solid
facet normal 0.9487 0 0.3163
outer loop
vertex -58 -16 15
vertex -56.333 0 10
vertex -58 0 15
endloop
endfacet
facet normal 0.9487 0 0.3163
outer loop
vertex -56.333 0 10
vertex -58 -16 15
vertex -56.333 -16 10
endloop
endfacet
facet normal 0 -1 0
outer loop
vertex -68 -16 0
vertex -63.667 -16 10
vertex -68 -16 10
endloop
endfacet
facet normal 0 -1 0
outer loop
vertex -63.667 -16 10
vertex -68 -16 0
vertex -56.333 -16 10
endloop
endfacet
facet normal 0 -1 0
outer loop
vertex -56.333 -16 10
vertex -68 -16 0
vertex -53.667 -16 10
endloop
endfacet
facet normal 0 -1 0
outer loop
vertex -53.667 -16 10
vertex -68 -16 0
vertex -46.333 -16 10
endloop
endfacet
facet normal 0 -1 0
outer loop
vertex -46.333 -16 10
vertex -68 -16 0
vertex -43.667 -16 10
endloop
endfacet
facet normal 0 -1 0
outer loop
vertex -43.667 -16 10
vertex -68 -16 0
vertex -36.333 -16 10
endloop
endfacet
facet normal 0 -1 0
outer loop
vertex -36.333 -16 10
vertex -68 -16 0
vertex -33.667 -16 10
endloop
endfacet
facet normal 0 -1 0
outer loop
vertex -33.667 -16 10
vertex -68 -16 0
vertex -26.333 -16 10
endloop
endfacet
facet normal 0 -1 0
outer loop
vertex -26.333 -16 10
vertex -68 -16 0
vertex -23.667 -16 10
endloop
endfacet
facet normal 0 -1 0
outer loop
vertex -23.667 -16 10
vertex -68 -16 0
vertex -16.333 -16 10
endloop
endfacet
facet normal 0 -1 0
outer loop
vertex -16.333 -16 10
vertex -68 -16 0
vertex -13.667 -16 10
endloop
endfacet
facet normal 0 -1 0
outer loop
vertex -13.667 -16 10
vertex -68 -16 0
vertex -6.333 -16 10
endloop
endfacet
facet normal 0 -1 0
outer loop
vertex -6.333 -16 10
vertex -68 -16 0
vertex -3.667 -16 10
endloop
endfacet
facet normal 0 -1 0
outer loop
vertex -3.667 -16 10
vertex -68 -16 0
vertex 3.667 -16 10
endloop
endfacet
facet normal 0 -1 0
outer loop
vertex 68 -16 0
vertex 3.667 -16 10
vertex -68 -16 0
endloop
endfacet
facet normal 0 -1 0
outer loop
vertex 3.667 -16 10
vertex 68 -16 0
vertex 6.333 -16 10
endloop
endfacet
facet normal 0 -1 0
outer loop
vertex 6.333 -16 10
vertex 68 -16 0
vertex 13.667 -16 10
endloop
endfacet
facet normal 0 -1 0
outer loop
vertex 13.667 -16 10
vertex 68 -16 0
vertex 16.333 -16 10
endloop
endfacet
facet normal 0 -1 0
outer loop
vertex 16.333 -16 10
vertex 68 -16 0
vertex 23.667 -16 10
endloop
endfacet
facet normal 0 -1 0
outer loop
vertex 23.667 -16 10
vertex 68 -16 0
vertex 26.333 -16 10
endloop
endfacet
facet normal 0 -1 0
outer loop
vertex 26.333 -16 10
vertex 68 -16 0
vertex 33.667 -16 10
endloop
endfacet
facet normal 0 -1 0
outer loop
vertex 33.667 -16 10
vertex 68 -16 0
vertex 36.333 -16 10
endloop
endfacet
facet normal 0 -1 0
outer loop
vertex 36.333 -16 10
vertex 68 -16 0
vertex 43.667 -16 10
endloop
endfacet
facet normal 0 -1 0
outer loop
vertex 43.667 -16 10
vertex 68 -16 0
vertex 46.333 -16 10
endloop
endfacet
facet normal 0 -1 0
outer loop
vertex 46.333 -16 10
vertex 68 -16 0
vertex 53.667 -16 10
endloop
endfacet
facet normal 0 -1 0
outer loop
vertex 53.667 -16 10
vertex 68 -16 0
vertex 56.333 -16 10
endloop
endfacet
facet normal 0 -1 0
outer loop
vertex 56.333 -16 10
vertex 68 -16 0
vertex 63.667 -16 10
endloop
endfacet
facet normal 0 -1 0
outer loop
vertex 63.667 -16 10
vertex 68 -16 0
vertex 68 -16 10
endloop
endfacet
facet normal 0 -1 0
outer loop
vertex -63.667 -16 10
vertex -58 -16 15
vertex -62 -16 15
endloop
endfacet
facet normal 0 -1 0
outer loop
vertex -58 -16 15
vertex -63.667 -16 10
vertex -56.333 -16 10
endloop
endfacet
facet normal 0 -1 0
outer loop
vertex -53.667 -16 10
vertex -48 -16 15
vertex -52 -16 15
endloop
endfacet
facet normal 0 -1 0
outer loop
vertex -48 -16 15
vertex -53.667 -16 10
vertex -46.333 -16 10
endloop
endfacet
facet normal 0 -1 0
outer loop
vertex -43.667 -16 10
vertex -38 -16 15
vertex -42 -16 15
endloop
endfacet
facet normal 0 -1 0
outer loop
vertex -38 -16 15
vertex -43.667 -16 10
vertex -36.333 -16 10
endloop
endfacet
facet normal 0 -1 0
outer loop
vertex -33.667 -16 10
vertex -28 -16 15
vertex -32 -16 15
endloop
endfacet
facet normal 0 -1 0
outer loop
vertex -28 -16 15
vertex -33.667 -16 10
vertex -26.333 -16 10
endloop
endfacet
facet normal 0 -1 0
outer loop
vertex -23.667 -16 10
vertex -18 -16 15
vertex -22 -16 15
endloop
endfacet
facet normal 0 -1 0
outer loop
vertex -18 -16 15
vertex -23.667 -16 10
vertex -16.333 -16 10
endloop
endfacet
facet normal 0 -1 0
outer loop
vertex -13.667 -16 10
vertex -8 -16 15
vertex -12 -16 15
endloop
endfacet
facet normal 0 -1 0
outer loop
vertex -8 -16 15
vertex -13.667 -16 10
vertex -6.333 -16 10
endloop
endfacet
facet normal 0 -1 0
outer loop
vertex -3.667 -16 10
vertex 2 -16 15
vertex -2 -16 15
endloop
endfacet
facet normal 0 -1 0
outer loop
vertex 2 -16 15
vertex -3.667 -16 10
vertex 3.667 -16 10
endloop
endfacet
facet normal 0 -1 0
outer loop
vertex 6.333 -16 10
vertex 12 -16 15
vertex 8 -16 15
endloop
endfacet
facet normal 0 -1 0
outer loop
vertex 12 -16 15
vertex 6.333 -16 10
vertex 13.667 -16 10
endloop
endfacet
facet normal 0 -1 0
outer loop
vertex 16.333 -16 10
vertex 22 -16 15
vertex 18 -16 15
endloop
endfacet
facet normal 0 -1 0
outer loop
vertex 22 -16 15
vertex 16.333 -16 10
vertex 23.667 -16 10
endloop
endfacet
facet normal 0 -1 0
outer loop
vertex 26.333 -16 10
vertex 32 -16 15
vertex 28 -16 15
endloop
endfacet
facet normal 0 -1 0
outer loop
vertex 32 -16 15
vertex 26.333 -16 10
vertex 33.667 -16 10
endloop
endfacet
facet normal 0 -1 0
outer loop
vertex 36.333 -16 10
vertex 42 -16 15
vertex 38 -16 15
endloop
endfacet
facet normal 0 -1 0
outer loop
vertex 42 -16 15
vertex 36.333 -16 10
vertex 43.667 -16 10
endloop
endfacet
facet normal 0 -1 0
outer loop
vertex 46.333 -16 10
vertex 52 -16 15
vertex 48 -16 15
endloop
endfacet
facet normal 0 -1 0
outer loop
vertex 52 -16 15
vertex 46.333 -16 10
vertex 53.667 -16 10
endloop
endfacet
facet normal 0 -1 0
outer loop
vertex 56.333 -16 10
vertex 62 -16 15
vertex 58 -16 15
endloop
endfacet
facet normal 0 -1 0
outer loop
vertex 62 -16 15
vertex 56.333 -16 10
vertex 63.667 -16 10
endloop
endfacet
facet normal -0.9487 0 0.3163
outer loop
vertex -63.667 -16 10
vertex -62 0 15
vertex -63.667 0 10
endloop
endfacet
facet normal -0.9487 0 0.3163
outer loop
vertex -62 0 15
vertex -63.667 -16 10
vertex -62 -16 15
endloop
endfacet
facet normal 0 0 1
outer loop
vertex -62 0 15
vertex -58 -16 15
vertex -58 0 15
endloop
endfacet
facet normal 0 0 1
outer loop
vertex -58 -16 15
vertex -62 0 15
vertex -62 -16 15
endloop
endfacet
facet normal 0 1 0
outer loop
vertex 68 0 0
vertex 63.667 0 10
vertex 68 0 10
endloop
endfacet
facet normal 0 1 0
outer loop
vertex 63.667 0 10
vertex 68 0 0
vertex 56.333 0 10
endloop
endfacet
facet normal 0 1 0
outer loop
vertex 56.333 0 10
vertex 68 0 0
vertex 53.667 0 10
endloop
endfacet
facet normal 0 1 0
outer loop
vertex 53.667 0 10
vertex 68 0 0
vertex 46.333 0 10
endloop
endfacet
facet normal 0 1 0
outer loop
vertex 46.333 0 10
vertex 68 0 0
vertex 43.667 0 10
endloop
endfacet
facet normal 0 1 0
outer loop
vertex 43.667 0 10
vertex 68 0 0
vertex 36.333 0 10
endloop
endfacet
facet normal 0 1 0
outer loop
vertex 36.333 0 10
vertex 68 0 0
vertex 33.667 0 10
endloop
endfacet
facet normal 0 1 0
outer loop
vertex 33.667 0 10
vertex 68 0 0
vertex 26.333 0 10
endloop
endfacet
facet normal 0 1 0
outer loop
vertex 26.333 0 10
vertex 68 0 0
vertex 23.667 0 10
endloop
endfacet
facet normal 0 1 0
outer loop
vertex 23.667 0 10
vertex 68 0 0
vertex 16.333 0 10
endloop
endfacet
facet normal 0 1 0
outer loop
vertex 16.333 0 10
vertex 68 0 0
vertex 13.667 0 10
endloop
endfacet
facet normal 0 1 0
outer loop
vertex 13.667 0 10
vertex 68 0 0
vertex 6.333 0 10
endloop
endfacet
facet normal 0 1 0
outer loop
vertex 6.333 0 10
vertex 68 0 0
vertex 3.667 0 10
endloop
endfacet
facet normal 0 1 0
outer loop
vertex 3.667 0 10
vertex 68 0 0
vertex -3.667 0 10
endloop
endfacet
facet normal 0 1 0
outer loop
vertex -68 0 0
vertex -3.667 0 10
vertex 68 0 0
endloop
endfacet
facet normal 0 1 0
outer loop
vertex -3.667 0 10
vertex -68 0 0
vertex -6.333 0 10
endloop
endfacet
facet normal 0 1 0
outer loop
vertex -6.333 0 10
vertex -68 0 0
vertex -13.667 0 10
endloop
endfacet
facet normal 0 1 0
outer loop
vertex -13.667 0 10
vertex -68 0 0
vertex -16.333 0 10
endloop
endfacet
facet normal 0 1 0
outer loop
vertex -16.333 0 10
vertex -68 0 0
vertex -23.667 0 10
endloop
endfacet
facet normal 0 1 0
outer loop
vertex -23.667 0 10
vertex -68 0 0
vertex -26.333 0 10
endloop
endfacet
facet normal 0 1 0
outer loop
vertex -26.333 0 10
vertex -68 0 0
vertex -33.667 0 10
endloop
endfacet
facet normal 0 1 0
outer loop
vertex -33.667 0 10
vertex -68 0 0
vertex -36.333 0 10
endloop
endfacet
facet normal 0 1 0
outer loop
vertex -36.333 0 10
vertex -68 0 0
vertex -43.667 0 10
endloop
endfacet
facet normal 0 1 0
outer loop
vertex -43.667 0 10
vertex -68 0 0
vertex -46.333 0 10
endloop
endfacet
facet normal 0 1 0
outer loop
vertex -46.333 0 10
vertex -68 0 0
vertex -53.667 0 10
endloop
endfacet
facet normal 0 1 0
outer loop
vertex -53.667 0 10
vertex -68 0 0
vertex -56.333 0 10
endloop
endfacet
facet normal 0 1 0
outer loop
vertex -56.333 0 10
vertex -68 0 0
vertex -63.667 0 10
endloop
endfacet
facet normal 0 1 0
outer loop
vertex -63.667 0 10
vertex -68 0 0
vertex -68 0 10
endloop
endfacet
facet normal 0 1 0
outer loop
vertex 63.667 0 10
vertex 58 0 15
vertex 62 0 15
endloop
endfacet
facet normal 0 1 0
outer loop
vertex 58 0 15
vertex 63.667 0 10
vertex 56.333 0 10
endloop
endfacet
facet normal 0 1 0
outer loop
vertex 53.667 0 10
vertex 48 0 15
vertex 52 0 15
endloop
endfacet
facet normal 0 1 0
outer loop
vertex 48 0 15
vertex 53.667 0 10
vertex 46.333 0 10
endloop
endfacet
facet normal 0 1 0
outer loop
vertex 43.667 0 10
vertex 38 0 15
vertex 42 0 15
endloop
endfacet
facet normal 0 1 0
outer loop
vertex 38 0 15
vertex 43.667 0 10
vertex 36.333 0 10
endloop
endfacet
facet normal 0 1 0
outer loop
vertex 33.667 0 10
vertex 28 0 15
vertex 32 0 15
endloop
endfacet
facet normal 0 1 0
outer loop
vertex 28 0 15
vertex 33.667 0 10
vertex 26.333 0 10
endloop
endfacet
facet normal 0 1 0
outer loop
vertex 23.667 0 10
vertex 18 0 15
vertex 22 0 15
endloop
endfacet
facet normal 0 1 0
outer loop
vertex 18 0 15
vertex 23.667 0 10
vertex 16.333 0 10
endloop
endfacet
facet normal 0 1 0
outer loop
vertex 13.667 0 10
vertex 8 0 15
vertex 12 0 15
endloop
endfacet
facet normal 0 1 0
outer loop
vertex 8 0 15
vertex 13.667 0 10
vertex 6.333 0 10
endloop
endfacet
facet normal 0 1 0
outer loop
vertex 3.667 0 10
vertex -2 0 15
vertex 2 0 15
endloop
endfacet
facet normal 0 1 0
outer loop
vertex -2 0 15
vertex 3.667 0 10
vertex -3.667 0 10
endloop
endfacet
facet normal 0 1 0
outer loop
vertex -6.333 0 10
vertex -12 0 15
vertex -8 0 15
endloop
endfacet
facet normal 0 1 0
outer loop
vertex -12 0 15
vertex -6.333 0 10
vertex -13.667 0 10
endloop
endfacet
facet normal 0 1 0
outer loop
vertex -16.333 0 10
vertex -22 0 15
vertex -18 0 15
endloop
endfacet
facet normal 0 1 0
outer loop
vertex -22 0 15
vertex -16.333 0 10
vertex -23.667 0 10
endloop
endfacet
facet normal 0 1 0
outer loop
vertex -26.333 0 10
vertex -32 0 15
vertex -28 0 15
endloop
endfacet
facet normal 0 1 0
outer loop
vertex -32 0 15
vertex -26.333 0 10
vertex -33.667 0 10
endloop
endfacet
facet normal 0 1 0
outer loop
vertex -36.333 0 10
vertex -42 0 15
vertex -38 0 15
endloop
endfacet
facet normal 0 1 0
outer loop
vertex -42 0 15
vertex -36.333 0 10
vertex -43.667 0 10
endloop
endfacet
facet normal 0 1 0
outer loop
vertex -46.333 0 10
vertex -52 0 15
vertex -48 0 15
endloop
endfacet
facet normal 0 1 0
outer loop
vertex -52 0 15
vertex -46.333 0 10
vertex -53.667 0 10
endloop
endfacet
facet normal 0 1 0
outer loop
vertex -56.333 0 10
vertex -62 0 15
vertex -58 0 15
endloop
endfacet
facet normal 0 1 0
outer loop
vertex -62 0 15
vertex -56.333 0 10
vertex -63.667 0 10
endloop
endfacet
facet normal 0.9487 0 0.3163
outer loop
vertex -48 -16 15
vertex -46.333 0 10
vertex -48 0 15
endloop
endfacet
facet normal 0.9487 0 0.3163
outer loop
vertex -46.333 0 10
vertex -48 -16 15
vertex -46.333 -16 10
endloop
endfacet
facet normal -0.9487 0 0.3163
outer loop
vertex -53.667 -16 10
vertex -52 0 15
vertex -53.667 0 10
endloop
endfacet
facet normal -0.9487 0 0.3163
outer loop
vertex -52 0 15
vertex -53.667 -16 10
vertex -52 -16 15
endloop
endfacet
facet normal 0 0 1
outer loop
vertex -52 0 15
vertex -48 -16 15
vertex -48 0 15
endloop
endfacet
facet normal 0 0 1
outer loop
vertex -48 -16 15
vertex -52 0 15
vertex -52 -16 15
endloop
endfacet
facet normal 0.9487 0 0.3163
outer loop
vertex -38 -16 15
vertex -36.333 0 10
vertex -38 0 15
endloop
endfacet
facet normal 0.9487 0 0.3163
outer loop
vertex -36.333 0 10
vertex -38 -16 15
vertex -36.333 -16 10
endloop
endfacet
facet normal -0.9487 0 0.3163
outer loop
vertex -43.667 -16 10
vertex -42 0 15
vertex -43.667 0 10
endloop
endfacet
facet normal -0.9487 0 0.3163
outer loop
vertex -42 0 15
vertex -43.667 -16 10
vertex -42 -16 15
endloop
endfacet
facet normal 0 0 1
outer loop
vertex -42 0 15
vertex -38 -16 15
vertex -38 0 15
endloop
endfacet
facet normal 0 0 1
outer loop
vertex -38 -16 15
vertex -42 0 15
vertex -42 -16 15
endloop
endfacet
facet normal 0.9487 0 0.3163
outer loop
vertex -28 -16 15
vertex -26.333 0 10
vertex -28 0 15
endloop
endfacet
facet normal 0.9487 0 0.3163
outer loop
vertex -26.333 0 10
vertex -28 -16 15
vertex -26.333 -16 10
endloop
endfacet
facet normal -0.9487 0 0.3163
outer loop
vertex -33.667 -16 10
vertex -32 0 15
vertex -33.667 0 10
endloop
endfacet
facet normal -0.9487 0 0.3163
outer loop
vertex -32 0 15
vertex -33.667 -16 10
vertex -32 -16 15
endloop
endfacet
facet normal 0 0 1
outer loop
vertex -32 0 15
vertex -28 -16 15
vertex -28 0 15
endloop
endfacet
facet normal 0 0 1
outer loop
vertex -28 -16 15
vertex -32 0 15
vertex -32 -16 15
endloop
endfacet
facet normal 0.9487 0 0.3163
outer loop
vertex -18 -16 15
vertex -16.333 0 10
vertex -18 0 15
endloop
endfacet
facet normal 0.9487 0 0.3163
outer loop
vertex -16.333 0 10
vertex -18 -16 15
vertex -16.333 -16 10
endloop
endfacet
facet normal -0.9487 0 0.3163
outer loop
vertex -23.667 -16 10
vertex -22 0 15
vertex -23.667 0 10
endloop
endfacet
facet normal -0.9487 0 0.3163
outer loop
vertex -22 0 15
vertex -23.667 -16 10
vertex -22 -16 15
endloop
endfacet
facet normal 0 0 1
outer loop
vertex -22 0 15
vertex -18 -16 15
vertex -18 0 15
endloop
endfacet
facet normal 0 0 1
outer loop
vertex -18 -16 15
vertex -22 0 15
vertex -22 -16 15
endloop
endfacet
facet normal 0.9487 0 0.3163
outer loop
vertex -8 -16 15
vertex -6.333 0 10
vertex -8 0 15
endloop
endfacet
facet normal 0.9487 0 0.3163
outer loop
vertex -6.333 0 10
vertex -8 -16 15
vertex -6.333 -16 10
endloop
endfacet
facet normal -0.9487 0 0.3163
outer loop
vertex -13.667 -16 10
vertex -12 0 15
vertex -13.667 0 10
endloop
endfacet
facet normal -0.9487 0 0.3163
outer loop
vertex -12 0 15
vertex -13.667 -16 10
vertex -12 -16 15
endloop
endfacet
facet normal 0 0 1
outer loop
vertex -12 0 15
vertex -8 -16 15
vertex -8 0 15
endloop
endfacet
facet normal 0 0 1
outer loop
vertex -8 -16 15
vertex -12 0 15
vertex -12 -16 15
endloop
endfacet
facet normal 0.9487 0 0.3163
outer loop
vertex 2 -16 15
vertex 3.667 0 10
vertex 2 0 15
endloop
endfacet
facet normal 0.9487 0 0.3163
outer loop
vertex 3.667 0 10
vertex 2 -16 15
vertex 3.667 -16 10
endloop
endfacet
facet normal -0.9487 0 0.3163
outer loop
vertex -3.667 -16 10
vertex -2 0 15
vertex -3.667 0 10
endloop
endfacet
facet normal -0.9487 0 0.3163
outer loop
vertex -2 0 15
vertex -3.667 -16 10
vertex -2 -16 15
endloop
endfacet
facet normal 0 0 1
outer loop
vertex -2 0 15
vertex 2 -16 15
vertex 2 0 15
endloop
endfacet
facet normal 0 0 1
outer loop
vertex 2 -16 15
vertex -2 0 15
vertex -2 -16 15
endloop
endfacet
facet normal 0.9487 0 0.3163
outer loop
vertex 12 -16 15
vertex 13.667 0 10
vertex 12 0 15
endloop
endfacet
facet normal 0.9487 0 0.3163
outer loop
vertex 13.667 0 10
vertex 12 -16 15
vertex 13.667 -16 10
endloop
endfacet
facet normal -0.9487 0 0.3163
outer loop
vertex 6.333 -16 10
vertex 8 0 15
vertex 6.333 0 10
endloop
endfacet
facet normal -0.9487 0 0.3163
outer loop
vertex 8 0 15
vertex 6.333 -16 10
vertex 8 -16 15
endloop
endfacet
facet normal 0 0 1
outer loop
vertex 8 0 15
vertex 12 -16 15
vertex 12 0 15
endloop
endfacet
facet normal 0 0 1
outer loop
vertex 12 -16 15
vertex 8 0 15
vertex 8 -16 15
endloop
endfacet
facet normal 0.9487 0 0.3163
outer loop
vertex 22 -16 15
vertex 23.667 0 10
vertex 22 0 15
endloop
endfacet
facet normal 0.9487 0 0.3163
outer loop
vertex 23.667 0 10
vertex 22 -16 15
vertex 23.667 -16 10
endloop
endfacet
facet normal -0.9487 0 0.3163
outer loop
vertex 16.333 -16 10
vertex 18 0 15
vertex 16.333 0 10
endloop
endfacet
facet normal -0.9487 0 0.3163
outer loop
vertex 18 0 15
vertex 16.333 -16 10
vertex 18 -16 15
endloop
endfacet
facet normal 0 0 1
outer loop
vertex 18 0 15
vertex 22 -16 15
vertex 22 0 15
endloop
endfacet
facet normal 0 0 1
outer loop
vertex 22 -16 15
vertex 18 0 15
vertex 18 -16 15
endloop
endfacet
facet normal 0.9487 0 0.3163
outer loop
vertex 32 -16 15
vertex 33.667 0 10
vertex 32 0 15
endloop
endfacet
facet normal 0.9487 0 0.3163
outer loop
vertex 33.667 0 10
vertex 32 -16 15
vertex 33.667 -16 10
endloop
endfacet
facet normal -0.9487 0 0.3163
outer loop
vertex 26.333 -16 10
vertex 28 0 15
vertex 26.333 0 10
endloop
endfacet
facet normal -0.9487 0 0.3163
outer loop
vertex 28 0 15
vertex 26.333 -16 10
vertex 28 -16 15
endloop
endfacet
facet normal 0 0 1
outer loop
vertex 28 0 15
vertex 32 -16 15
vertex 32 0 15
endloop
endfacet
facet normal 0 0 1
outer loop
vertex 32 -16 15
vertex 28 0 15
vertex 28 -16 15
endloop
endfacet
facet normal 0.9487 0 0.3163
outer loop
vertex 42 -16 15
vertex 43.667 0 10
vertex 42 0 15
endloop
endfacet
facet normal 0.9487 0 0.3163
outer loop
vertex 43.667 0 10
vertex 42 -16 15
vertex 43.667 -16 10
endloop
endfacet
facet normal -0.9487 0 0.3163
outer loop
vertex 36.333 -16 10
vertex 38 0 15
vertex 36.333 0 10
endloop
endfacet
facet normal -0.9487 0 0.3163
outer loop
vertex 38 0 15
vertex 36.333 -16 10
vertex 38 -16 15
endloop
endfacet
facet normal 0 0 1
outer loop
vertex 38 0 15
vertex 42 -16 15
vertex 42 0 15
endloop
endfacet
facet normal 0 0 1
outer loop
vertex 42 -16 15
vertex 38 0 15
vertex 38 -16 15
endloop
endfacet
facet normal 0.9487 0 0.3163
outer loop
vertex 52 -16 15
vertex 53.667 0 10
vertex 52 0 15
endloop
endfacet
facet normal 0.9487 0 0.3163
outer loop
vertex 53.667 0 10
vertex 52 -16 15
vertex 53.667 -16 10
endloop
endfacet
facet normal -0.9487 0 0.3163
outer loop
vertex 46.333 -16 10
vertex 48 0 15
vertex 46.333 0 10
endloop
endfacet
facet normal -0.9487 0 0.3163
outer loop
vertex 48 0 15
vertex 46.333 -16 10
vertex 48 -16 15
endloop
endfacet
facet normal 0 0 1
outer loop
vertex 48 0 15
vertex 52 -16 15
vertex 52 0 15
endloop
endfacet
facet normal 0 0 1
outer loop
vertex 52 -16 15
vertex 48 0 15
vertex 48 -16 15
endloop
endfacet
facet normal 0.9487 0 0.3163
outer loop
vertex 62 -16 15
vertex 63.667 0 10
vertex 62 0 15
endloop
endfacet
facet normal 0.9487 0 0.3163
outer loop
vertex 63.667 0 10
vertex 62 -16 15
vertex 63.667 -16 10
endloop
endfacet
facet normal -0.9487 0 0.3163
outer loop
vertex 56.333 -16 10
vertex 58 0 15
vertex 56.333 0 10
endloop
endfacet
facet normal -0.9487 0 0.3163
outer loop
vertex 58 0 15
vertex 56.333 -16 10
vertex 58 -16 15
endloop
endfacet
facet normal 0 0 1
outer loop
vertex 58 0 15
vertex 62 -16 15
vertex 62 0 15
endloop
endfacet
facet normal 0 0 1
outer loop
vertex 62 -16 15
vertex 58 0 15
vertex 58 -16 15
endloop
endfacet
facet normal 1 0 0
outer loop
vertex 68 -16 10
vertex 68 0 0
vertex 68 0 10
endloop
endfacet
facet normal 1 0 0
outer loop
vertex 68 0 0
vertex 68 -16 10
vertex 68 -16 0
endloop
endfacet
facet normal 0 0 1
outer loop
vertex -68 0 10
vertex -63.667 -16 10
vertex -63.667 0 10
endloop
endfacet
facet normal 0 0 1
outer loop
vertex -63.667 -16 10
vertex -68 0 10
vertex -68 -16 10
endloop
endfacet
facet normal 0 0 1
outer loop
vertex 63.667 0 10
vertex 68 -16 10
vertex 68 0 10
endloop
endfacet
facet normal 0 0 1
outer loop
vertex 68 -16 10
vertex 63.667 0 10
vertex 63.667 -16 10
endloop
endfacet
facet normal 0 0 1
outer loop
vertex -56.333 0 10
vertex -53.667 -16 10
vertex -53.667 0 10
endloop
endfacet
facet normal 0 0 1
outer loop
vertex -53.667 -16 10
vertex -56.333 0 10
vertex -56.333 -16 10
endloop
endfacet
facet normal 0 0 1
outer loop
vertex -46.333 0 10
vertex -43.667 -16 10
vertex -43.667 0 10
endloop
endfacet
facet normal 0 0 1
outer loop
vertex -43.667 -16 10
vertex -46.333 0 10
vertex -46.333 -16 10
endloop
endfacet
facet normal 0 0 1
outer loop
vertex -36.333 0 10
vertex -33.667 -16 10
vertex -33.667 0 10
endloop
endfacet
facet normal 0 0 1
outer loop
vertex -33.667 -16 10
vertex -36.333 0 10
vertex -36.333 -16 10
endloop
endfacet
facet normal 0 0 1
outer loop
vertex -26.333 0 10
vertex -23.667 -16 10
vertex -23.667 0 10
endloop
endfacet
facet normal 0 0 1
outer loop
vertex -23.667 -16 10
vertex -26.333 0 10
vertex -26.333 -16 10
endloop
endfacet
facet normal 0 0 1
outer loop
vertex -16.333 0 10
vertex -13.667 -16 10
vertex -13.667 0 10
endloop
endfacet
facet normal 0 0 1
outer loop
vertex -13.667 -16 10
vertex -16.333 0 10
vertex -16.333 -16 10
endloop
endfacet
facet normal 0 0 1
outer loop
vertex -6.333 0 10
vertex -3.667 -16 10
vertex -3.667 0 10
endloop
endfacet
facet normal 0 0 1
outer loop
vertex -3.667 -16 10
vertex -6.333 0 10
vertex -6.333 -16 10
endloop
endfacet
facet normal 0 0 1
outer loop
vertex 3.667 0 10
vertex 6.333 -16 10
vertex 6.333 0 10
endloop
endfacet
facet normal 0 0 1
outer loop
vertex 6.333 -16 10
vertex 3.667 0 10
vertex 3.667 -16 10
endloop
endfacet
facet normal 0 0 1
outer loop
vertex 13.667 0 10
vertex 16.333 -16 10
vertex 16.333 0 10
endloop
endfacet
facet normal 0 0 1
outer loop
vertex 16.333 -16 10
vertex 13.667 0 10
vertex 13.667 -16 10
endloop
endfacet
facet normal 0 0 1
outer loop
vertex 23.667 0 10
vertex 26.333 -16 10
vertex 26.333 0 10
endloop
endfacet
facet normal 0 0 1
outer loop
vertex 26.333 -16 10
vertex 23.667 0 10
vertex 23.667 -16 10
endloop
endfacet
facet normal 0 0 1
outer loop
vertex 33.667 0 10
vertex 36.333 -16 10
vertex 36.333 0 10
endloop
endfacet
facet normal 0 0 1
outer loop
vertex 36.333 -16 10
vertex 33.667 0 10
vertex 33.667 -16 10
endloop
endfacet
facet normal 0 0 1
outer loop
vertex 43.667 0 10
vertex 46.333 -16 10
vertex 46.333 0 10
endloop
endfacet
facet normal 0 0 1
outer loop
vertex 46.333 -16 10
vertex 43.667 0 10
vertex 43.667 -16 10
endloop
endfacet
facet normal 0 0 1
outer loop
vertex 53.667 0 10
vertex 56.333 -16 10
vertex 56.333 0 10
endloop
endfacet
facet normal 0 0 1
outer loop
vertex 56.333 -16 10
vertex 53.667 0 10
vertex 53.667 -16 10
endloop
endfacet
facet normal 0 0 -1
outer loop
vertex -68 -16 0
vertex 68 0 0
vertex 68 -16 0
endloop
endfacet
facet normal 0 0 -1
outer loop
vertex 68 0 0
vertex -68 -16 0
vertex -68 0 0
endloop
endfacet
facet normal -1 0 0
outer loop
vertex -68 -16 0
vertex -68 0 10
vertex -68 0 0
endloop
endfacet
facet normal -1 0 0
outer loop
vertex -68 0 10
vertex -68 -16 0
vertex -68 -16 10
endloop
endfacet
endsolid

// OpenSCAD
$fn = 32;

// ----------------------------------------------------------------------
// Toothed rack, 13 teeth
// 10 mm pitch, 5 mm teeth
// ----------------------------------------------------------------------

// --- parameters (mm) ---
bar_w = 16;   // bar width (Y)
bar_h = 10;   // bar height (Z)
teeth = 13;   // number of teeth
pitch = 10;   // tooth pitch
tooth_h = 5;  // tooth height above the bar
root_w = 8;   // tooth width at the root
crest_w = 4;  // tooth width at the crest

// --- derived feature positions (mm) ---
span = (teeth - 1) * pitch;  // = 120   distance between the outer teeth
bar_l = span + root_w + 8;   // = 136   bar length: teeth plus 4 mm at each end
tooth_x = -span / 2;         // = -60   X of the first tooth
height = bar_h + tooth_h;    // = 15   overall height
feature_centers = [
  [tooth_x + 0 * pitch, -bar_w / 2],
  [tooth_x + 1 * pitch, -bar_w / 2],
  [tooth_x + 2 * pitch, -bar_w / 2],
  [tooth_x + 3 * pitch, -bar_w / 2],
  [tooth_x + 4 * pitch, -bar_w / 2],
  [tooth_x + 5 * pitch, -bar_w / 2],
  [tooth_x + 6 * pitch, -bar_w / 2],
  [tooth_x + 7 * pitch, -bar_w / 2],
  [tooth_x + 8 * pitch, -bar_w / 2],
  [tooth_x + 9 * pitch, -bar_w / 2],
  [tooth_x + 10 * pitch, -bar_w / 2],
  [tooth_x + 11 * pitch, -bar_w / 2],
  [tooth_x + 12 * pitch, -bar_w / 2]
];   // tooth centre line, drives the tooth loop

// bar with a rack of teeth, one extruded trapezoium per centre
module rack_tooth() {
  linear_extrude(height = bar_w)
    polygon(points = [
      [0, 0],
      [root_w, 0],
      [root_w / 2 + crest_w / 2, tooth_h + 1],
      [root_w / 2 - crest_w / 2, tooth_h + 1]
    ]);
}

union() {
  translate([-bar_l / 2, -bar_w, 0]) cube([bar_l, bar_w, bar_h]);
  for (centre = feature_centers)
    translate([centre[0] - root_w / 2, 0, bar_h - 1]) rotate([90, 0, 0]) rack_tooth();
}
